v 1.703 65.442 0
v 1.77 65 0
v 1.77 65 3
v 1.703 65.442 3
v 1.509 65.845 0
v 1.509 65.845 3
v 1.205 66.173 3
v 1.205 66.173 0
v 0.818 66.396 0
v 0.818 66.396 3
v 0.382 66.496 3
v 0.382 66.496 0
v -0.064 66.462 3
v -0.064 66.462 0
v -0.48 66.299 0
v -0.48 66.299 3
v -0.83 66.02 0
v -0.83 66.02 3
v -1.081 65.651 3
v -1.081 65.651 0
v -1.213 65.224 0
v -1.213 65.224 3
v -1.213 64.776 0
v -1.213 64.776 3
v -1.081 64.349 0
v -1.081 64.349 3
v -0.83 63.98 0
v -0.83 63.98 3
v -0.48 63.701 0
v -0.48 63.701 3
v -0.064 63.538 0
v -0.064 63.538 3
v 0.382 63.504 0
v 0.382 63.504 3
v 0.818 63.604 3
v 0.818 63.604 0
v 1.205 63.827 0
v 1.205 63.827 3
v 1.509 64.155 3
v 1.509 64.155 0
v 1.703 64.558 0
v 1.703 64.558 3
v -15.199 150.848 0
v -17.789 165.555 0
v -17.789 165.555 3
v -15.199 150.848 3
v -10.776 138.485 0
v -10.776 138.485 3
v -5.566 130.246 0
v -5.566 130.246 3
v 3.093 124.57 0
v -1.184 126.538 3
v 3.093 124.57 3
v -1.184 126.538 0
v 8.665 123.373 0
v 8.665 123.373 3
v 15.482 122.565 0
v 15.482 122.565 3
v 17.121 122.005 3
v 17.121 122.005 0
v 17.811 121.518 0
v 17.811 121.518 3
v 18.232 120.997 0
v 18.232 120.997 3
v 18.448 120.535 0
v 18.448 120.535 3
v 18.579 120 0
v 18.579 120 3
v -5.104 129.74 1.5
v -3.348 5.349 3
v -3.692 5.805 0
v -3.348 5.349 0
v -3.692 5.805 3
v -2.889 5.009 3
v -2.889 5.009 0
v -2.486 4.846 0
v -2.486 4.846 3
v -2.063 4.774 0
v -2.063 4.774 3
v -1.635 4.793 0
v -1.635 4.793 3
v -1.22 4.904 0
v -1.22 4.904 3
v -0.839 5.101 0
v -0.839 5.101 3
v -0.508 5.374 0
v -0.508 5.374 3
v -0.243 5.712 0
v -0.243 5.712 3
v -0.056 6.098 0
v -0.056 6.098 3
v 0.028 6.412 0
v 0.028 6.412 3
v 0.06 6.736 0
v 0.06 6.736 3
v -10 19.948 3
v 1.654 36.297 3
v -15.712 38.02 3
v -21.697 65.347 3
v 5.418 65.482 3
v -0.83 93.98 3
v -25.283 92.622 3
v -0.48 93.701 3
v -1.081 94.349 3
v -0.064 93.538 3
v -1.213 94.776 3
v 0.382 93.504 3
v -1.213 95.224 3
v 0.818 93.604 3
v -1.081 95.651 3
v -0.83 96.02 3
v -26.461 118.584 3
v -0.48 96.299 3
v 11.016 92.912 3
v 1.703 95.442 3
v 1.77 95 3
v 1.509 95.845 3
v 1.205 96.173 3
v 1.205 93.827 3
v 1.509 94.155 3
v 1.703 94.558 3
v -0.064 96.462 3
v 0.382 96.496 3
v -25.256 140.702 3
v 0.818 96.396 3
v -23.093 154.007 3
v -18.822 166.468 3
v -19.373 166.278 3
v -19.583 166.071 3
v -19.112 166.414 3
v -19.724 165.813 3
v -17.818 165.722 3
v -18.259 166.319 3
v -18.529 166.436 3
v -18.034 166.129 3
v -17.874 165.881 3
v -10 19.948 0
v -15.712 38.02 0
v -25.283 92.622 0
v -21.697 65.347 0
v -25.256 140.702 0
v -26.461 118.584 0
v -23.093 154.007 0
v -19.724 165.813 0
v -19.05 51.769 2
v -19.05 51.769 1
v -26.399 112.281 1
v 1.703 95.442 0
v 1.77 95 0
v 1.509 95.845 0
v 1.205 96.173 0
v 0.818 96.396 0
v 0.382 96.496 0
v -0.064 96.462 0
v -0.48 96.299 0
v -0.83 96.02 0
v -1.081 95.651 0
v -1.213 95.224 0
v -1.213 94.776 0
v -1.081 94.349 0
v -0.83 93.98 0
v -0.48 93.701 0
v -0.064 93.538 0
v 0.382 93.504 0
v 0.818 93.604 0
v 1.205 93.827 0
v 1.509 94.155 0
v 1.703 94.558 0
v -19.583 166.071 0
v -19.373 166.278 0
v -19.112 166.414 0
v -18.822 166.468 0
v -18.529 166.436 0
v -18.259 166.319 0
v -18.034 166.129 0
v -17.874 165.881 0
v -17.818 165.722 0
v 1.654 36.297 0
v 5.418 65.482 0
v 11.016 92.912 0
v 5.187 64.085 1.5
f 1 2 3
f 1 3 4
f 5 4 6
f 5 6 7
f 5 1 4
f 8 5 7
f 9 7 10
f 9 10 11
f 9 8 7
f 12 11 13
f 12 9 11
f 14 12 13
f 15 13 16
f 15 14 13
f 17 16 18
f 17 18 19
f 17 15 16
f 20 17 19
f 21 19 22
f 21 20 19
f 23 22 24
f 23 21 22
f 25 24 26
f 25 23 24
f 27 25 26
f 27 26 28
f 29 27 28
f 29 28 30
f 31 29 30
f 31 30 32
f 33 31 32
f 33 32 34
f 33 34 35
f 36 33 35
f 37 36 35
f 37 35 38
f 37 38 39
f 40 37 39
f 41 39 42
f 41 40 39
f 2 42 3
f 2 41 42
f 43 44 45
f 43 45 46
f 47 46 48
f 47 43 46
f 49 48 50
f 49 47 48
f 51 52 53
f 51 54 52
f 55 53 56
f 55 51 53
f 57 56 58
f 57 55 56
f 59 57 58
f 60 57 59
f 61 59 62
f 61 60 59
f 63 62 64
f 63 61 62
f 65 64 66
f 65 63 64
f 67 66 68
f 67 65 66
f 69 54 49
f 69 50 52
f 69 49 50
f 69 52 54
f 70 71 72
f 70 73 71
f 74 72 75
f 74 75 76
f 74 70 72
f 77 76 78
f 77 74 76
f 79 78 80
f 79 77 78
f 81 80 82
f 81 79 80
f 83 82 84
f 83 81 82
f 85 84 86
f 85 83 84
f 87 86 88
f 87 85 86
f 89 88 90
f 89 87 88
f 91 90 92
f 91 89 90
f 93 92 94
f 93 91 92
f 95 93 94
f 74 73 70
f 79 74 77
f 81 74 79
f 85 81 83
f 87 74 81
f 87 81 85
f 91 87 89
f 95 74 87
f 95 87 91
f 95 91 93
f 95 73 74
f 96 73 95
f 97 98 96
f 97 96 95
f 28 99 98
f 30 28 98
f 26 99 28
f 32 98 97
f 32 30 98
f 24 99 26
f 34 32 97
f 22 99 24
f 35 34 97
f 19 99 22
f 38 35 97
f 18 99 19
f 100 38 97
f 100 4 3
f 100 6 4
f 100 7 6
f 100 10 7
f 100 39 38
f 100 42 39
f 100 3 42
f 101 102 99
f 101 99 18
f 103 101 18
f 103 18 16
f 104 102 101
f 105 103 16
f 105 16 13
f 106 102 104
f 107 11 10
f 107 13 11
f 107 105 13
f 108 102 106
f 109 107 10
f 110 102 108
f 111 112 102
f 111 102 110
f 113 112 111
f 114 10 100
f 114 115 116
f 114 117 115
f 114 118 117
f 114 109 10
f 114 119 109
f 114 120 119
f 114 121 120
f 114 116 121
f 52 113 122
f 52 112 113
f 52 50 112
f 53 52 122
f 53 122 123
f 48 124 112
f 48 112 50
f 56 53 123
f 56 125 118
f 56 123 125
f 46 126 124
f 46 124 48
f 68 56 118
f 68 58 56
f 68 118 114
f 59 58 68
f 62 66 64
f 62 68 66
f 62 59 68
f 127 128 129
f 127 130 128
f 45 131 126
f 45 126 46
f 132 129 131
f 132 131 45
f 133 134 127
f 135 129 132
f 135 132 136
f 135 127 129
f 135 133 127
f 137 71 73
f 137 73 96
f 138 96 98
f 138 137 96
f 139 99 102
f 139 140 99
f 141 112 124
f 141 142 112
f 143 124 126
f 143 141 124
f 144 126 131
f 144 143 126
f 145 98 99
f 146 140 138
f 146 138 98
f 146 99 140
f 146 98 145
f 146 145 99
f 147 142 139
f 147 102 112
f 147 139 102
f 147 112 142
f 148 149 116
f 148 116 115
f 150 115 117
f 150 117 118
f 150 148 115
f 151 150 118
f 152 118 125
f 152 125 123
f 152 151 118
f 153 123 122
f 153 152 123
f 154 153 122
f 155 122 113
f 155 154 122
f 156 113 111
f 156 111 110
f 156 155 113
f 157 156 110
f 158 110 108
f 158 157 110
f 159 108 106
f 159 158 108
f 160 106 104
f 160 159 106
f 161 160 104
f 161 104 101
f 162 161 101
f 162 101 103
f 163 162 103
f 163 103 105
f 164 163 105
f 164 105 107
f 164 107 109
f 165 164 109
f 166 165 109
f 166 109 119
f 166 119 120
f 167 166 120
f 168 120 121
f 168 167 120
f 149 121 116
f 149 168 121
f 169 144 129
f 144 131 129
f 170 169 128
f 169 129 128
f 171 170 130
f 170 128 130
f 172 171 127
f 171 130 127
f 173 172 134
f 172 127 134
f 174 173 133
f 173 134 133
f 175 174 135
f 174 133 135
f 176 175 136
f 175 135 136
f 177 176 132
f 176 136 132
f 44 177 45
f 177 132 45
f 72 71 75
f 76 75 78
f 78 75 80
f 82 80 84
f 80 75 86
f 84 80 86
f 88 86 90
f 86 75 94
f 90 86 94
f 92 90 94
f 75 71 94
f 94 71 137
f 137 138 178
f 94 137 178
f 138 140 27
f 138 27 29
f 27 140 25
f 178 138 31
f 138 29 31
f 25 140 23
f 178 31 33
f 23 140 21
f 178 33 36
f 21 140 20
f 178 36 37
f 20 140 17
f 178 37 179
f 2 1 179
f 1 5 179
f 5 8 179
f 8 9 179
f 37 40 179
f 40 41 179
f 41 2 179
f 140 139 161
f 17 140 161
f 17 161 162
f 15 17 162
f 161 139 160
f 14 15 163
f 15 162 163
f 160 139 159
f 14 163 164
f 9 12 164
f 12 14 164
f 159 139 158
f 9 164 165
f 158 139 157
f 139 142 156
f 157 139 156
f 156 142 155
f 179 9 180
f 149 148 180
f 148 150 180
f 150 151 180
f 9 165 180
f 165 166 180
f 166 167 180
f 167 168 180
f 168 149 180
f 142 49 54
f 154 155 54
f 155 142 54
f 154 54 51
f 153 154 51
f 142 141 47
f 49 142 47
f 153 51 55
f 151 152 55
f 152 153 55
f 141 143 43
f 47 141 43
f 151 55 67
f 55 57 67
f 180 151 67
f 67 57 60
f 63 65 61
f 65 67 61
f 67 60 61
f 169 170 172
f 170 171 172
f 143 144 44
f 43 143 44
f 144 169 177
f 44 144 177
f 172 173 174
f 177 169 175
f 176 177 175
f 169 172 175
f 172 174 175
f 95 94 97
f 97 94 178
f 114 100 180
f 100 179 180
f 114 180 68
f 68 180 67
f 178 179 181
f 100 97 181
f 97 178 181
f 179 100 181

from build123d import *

# Parameters (mm, degrees)
SKETCH1_R           = 1.5
BOSS_EXTRUDE1_DEPTH = 3
FILLET1_R           = 1
FILLET2_R           = 2


with BuildPart() as part:
    # Sketch1 → Boss-Extrude1 (new body)
    with BuildSketch(Plane.XY):
        with BuildLine():
            add(Edge.make_bspline(
                [(0, 0), (0.039034334, 61.604929497), (18.579234973, 120)],
                knots=[0, 0, 0, 1, 1, 1], degree=2))
            add(Edge.make_bspline(
                [(-18.032786885, 170), (-17.742349194, 156.285056374), (-6.538751715, 115.023114242), (17.720626912, 125.598656039), (18.579234973, 120)],
                knots=[0, 0, 0, 0, 0.447403359, 1, 1, 1, 1], degree=3))
            add(Edge.make_bspline(
                [(0, 0), (-19.47734459, 25.868323257), (-37.629056536, 125.986890488), (-18.032786885, 170)],
                knots=[0, 0, 0, 0, 1, 1, 1, 1], degree=3))
        make_face()
        with Locations((0.270016121, 65)):
            Circle(SKETCH1_R, mode=Mode.SUBTRACT)
        with Locations((0.270016121, 95)):
            Circle(SKETCH1_R, mode=Mode.SUBTRACT)
    extrude(amount=BOSS_EXTRUDE1_DEPTH)

    # Fillet1
    fillet1_edges = [part.edges().sort_by_distance(p)[0] for p in [
        (-18.032786885, 170, 1.5),
    ]]
    fillet(fillet1_edges, radius=FILLET1_R)

    # Fillet2
    fillet2_edges = [part.edges().sort_by_distance(p)[0] for p in [
        (0, 0, 1.5),
    ]]
    fillet(fillet2_edges, radius=FILLET2_R)


solid = part.part
